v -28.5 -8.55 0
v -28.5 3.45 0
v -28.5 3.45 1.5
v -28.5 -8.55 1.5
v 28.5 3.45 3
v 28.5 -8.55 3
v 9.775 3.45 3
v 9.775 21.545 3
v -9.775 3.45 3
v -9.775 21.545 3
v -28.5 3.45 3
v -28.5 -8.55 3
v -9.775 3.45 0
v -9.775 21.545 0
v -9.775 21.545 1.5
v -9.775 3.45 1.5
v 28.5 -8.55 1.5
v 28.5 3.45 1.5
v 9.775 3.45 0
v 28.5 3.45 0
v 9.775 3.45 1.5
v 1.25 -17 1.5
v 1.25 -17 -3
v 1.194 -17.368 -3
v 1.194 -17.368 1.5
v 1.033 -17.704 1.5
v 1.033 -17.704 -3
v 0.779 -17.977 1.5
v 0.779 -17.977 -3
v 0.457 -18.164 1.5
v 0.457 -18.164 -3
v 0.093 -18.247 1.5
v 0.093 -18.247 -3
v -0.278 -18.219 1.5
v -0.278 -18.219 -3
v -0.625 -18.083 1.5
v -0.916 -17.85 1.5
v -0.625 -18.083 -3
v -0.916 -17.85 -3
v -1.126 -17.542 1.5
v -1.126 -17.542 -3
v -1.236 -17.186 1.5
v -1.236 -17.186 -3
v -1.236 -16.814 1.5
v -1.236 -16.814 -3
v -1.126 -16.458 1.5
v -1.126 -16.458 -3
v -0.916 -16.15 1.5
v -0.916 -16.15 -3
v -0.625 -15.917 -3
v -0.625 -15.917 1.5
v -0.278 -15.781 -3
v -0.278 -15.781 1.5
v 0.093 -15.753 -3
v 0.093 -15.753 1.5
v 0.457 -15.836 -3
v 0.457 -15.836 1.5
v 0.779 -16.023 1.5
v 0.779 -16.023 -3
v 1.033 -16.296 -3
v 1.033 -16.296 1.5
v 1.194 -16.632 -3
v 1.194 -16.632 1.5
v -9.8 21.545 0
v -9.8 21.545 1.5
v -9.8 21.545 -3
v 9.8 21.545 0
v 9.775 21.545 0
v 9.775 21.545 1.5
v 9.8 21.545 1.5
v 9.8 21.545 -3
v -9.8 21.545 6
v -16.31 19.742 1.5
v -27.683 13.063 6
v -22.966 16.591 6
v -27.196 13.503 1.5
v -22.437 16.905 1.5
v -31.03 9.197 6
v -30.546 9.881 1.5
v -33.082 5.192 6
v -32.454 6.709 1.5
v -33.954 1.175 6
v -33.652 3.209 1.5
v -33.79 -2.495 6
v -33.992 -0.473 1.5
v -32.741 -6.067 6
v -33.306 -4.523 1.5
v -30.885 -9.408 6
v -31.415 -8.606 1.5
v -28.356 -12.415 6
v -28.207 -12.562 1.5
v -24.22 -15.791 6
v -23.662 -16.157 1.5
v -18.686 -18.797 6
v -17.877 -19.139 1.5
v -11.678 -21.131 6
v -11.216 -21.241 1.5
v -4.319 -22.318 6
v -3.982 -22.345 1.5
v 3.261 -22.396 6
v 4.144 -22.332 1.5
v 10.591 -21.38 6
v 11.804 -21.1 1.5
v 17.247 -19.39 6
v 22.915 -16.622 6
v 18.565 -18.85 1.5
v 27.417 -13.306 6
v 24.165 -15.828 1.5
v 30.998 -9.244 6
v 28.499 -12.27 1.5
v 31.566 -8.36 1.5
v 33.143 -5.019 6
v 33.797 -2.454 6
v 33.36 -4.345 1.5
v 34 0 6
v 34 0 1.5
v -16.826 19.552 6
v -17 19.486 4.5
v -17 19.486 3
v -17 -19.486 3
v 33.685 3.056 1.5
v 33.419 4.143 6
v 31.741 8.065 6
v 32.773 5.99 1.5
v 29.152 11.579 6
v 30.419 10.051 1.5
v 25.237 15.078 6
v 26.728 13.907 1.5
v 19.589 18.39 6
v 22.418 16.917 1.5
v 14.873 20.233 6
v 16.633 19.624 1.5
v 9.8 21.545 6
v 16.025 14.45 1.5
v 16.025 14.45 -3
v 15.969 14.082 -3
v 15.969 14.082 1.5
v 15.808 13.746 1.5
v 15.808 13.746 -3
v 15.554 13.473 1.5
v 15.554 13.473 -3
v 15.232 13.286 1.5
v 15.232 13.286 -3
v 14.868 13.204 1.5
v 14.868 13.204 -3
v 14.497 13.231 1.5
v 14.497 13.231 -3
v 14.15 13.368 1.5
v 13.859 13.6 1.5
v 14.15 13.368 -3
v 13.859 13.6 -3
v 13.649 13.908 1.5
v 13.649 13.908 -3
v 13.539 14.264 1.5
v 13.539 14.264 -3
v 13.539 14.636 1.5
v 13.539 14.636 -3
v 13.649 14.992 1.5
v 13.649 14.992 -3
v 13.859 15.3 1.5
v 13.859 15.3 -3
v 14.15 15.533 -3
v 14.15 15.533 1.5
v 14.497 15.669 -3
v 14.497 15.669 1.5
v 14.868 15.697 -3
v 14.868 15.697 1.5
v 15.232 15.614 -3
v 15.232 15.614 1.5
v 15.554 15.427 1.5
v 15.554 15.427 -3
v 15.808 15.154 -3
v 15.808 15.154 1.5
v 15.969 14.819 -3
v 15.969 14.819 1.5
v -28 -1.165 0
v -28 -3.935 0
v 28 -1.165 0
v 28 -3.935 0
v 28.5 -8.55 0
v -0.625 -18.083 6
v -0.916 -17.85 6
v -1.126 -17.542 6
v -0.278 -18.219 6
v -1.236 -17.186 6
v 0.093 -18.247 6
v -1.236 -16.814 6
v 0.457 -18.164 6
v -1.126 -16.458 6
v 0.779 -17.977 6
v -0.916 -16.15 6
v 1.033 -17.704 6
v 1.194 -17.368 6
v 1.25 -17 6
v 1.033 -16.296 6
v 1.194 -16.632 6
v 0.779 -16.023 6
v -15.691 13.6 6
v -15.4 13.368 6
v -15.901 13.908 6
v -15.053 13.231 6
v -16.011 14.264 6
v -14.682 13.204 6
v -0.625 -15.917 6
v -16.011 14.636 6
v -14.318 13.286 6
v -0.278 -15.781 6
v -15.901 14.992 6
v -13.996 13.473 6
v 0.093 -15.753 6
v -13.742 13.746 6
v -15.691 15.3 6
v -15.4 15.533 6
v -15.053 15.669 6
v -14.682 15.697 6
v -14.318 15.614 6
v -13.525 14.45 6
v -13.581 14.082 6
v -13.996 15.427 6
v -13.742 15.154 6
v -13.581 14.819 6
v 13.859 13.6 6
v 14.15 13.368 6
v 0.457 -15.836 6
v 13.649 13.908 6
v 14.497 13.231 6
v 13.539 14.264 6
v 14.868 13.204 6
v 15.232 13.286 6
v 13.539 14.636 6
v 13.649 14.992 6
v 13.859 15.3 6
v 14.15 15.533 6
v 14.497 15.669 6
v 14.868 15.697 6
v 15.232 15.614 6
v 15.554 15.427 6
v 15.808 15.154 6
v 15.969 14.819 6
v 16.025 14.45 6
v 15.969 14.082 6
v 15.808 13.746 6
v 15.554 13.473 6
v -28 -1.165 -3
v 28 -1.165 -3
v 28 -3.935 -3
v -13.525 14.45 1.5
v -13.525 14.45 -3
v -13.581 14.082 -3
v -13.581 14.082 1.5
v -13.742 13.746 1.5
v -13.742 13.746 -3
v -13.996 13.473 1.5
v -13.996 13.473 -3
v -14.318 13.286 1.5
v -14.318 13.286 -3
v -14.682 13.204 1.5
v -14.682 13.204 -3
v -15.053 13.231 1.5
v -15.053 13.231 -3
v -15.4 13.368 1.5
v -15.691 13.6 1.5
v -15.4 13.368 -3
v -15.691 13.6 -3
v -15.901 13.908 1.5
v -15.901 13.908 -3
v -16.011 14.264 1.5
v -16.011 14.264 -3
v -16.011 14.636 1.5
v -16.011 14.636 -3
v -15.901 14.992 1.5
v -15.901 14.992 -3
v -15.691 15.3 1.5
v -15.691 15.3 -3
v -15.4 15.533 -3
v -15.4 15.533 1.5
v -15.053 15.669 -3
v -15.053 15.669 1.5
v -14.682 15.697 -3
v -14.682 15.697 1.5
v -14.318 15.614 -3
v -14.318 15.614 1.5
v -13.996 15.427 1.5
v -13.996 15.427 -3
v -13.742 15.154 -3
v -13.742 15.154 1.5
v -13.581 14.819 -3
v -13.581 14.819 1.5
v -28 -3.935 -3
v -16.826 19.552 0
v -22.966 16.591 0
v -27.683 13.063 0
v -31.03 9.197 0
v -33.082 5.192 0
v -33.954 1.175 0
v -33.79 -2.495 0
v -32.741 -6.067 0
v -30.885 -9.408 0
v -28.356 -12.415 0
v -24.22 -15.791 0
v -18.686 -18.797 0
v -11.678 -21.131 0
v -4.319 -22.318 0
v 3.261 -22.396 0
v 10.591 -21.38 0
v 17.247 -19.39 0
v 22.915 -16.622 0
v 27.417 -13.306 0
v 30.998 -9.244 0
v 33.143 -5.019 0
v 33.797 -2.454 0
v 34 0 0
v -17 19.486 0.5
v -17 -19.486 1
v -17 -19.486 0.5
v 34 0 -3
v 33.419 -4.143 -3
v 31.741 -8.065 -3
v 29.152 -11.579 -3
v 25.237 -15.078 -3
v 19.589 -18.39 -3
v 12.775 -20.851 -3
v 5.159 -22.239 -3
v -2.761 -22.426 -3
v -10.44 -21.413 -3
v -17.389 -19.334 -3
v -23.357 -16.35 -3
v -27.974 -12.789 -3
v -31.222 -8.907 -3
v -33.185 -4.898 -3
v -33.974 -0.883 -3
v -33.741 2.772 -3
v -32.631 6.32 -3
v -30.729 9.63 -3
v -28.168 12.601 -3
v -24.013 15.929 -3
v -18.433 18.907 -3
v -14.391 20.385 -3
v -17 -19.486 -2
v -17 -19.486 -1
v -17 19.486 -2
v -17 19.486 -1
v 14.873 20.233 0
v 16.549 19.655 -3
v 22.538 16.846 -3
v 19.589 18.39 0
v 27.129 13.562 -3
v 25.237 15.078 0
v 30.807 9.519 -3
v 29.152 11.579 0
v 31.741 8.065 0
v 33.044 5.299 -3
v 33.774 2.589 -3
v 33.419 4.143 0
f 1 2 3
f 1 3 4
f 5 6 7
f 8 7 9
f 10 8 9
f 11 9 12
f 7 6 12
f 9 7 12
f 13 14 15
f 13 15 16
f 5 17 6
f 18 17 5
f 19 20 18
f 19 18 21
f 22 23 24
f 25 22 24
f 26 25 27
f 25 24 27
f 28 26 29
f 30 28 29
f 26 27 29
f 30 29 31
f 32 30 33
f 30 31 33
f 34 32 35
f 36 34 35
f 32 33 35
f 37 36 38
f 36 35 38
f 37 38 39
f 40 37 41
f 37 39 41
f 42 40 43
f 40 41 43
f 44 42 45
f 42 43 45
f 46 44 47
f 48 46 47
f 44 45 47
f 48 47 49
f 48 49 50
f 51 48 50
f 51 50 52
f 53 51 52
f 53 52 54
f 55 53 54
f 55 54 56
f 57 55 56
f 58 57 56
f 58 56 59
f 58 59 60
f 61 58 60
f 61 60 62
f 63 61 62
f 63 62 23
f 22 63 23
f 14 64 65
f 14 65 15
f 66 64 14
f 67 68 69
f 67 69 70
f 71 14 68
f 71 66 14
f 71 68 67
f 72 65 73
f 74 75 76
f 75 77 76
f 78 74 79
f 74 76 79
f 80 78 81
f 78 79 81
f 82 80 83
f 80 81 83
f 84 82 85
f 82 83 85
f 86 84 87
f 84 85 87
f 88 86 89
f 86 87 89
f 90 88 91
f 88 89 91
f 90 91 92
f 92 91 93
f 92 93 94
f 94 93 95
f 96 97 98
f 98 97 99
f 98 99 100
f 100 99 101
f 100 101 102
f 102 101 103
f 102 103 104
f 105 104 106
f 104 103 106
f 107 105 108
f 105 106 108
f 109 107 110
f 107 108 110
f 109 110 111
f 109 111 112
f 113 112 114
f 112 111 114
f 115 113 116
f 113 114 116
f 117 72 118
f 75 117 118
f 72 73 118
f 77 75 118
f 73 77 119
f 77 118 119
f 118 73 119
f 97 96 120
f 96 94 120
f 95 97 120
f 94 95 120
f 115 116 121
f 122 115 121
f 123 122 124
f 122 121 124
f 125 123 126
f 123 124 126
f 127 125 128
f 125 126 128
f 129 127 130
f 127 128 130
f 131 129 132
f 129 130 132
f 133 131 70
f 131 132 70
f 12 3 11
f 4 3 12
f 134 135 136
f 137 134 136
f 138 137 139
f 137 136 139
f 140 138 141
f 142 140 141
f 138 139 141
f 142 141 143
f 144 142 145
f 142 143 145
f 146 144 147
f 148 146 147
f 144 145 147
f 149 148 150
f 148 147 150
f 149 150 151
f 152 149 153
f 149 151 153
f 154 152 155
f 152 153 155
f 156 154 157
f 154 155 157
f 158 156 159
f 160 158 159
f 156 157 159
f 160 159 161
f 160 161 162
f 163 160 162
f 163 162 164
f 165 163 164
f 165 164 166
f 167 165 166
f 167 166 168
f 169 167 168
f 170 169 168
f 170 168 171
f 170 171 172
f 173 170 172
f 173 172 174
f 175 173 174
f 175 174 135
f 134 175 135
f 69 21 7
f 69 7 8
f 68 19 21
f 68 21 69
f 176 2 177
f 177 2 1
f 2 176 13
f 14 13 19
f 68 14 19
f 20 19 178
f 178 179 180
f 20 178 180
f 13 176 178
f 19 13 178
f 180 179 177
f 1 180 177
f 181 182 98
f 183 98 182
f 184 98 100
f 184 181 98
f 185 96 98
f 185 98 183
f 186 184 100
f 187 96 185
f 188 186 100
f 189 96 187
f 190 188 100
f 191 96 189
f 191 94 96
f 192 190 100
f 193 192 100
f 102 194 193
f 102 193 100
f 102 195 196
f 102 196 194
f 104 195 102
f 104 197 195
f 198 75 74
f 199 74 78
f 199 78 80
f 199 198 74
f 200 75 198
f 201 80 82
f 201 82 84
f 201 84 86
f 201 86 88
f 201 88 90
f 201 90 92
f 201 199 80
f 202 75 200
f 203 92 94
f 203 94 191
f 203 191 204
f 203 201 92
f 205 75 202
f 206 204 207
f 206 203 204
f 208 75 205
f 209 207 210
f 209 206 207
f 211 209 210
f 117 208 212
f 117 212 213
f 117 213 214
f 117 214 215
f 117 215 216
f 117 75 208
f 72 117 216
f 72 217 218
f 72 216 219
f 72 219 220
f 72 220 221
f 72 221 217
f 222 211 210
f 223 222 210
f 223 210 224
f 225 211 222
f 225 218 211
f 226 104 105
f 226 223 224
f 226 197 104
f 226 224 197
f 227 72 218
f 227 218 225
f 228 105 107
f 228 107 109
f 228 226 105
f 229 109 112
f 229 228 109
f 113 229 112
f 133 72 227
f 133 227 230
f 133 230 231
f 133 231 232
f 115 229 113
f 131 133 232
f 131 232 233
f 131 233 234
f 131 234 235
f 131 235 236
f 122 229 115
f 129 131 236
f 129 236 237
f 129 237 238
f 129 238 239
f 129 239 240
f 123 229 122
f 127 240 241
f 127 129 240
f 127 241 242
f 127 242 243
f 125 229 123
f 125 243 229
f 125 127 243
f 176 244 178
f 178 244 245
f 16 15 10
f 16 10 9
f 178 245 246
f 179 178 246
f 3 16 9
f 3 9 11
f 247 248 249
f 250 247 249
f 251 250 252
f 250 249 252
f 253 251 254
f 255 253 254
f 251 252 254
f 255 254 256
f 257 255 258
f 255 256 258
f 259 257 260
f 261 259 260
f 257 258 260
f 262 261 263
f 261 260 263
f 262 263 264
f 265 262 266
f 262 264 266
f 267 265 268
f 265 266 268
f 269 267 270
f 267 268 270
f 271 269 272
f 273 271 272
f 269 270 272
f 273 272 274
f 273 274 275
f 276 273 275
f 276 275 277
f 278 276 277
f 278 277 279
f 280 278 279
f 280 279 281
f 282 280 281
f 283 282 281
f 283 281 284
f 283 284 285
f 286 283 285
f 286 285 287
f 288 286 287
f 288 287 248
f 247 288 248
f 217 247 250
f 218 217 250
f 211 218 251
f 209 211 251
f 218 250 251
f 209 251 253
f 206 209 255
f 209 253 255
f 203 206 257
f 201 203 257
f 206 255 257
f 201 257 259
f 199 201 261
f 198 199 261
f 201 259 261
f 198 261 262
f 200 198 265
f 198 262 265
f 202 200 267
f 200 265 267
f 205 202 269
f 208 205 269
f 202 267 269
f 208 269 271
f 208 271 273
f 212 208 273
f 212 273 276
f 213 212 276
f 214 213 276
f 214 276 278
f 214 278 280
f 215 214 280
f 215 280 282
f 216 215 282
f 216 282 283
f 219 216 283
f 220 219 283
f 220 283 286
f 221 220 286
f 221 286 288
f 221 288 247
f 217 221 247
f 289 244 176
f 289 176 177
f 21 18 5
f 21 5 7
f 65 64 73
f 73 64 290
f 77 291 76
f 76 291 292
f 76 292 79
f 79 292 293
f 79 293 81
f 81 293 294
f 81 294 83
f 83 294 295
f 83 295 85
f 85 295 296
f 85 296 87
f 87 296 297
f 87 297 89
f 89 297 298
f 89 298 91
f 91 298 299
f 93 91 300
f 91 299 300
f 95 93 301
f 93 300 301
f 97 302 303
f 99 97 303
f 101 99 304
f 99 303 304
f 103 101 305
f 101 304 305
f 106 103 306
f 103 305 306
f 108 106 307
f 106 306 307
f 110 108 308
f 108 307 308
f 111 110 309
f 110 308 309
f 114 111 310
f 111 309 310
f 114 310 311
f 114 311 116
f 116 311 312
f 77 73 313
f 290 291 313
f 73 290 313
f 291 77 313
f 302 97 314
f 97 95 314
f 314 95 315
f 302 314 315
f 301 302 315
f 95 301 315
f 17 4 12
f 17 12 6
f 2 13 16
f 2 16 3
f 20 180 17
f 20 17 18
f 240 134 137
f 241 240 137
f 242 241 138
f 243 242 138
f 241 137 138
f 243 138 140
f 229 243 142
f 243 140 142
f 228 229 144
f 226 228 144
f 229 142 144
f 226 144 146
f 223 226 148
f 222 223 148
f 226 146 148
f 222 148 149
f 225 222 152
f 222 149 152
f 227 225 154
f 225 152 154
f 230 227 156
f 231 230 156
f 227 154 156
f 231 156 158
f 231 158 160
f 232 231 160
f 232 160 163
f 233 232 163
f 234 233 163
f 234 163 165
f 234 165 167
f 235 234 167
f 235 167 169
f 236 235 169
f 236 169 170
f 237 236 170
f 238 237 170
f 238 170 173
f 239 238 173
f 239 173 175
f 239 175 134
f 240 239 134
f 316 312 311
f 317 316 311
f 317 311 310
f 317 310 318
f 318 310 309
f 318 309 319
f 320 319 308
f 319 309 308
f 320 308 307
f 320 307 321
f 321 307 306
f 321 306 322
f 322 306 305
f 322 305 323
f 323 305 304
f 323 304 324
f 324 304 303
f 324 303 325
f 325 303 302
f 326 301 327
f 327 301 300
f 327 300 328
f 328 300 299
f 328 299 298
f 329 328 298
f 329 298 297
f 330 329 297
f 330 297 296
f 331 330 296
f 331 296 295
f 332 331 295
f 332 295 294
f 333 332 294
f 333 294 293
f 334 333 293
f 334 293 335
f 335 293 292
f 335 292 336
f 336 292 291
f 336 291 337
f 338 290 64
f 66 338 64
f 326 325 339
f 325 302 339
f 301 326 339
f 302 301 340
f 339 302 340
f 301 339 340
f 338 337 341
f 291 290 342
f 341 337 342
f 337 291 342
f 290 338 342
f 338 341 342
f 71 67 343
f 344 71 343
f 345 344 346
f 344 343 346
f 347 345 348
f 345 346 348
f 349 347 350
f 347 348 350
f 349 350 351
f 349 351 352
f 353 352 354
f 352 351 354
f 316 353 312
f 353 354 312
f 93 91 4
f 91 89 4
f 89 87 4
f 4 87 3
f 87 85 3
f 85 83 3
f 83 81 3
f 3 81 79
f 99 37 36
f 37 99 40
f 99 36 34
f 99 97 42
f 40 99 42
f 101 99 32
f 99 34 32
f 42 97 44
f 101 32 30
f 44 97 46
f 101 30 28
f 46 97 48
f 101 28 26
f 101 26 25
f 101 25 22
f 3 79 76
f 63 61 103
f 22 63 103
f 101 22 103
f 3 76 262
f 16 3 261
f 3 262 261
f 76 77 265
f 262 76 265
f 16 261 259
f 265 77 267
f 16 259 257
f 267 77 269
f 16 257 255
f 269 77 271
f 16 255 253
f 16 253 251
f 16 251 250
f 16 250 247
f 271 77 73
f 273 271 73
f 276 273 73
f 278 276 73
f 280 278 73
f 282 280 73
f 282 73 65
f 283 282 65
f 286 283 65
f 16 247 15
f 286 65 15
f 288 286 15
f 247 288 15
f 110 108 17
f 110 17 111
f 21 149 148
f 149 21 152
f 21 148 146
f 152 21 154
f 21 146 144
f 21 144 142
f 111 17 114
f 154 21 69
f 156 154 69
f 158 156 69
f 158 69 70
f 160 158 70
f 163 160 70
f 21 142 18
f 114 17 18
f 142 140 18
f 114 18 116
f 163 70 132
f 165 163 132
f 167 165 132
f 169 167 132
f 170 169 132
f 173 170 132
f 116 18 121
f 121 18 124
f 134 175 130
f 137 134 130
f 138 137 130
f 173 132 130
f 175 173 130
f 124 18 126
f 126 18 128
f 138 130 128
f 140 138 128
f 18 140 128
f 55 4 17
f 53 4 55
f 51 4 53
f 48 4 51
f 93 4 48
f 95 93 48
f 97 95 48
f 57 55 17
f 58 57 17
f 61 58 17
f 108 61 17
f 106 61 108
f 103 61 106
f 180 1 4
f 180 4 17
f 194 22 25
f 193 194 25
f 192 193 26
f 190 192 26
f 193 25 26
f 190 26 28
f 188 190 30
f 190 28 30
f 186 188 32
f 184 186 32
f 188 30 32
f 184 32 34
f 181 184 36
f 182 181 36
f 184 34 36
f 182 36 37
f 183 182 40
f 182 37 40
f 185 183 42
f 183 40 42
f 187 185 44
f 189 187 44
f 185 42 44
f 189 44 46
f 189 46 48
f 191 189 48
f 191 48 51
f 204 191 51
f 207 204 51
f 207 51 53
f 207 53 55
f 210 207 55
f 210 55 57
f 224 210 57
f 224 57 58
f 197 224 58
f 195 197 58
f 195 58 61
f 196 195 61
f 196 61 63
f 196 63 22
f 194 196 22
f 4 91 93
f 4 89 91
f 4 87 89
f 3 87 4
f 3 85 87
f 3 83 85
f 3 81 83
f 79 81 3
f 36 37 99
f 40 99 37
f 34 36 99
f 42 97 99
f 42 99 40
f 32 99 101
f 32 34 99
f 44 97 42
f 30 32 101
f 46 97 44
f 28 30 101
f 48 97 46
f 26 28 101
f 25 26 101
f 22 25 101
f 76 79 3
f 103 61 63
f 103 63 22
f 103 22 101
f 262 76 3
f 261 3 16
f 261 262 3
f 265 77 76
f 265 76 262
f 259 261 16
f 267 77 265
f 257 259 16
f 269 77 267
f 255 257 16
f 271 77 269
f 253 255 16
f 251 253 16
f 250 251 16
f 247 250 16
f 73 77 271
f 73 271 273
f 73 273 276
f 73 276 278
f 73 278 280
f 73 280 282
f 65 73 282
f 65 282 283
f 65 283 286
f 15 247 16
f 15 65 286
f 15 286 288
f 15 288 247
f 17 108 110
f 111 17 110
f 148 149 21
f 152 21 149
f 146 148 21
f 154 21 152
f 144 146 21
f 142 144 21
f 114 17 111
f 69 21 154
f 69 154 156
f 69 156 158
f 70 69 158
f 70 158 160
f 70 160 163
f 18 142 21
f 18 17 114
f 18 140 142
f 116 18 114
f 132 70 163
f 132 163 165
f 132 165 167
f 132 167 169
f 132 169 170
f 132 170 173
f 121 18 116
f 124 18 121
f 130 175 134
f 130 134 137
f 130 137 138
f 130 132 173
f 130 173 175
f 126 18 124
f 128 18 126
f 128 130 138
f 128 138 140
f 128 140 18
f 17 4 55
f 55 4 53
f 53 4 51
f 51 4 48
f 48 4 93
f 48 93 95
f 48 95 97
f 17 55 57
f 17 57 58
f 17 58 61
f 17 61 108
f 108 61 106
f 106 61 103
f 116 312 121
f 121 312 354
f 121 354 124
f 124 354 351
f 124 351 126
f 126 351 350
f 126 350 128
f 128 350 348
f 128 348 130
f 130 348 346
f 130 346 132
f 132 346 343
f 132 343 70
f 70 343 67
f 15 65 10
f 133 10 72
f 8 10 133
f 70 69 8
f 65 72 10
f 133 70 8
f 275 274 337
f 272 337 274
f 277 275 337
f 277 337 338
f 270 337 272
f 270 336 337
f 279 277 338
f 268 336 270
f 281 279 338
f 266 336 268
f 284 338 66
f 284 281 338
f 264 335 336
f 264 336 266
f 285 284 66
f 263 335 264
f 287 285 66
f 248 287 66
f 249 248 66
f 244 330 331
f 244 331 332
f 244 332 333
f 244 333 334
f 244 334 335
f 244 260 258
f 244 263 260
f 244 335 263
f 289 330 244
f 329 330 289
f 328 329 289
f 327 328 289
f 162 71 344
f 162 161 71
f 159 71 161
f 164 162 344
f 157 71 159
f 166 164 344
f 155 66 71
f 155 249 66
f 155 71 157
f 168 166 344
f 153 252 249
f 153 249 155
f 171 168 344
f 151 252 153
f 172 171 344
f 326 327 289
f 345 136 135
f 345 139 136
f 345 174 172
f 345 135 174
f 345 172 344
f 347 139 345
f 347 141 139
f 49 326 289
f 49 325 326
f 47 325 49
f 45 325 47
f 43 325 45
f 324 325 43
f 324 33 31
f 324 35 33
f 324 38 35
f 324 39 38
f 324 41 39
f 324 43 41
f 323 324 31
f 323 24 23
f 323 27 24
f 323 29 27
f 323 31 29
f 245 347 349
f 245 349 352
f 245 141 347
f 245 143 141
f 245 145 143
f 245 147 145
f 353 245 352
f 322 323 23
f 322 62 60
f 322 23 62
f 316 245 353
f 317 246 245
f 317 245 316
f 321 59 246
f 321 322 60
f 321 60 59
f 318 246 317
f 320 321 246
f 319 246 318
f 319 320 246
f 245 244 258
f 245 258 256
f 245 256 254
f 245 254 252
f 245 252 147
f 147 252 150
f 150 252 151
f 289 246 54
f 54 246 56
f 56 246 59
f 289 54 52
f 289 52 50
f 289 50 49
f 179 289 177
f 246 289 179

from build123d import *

# Parameters (mm, degrees)
BOX_BOTTOM_HALF_0_W     = 69.994952
BOX_BOTTOM_HALF_0_H     = 46.031044
BOX_BOTTOM_HALF_0_DEPTH = 5.5
PAD_DEPTH               = 6
POCKET_DEPTH            = 3
PAD001_DEPTH            = 3
SKETCH003_W             = 56
SKETCH003_H             = 2.77
POCKET001_DEPTH         = 3
SKETCH004_W             = 19.6
SKETCH004_H             = 1
POCKET002_DEPTH         = 9.001
SKETCH005_R             = 1.25
POCKET003_DEPTH         = 9.001


with BuildPart() as box_bottom_half_0_body:
    # box_bottom_half_0 → box_bottom_half_0 (new body)
    with BuildSketch(Plane(origin=(-34.994952, -23.485952, -4), x_dir=(1, 0, 0), z_dir=(0, 0, 1))):
        with Locations((34.997476, 23.015522)):
            Rectangle(BOX_BOTTOM_HALF_0_W, BOX_BOTTOM_HALF_0_H)
    extrude(amount=BOX_BOTTOM_HALF_0_DEPTH)


with BuildPart() as body:
    # Sketch → Pad (new body)
    with BuildSketch(Plane.XY):
        with BuildLine():
            add(Edge.make_bspline(
                [(34, 0), (34, 38.971143), (-17, 19.485572), (-68, 0), (-17, -19.485572), (34, -38.971143), (34, 0)],
                knots=[0, 0, 0, 2.094395, 2.094395, 4.18879, 4.18879, 6.283185, 6.283185, 6.283185], degree=2, weights=[1, 0.5, 1, 0.5, 1, 0.5, 1]))
        make_face()
    extrude(amount=PAD_DEPTH)

    # Sketch001 (on Face2 of Pad) → Pocket (cut)
    with BuildSketch(Plane(origin=(0, 0, 0), x_dir=(1, 0, 0), z_dir=(0, 0, -1))):
        Polygon((9.775, -3.450064), (9.775, -21.550064), (-9.775, -21.550064), (-9.775, -3.450064), (-28.5, -3.450064), (-28.5, 8.549936), (28.5, 8.549936), (28.5, -3.450064), align=None)
    extrude(amount=-POCKET_DEPTH, mode=Mode.SUBTRACT)

    # Sketch002 (on Face2 of Pocket) → Pad001 (join)
    with BuildSketch(Plane(origin=(0, 0, 0), x_dir=(1, 0, 0), z_dir=(0, 0, -1))):
        with BuildLine():
            add(Edge.make_bspline(
                [(34, 0), (34, 38.971143), (-17, 19.485572), (-68, 0), (-17, -19.485572), (34, -38.971143), (34, 0)],
                knots=[0, 0, 0, 2.094395, 2.094395, 4.18879, 4.18879, 6.283185, 6.283185, 6.283185], degree=2, weights=[1, 0.5, 1, 0.5, 1, 0.5, 1]))
        make_face()
    extrude(amount=PAD001_DEPTH)

    # Sketch003 (on Face4 of Pad001) → Pocket001 (cut)
    with BuildSketch(Plane(origin=(0, 0, -3), x_dir=(1, 0, 0), z_dir=(0, 0, -1))):
        with Locations((0, 2.549936)):
            Rectangle(SKETCH003_W, SKETCH003_H)
    extrude(amount=-POCKET001_DEPTH, mode=Mode.SUBTRACT)

    # Sketch004 (on Face4 of Pocket001) → Pocket002 (cut, through all)
    with BuildSketch(Plane(origin=(0, 0, -3), x_dir=(1, 0, 0), z_dir=(0, 0, -1))):
        with Locations((0, -22.045091)):
            Rectangle(SKETCH004_W, SKETCH004_H)
    extrude(amount=-POCKET002_DEPTH, mode=Mode.SUBTRACT)

    # Sketch005 (on Face7 of Pocket002) → Pocket003 (cut, through all)
    with BuildSketch(Plane(origin=(0, 0, -3), x_dir=(1, 0, 0), z_dir=(0, 0, -1))):
        with Locations((-14.775, -14.450064)):
            Circle(SKETCH005_R)
        with Locations((0, 17)):
            Circle(SKETCH005_R)
        with Locations((14.775, -14.450064)):
            Circle(SKETCH005_R)
    extrude(amount=-POCKET003_DEPTH, mode=Mode.SUBTRACT)


with BuildPart() as bottom_half_0_body:
    # bottom_half_0 base: copy of Body
    add(body.part)

    # bottom_half_0: intersect box_bottom_half_0 body
    add(box_bottom_half_0_body.part, mode=Mode.INTERSECT)


with BuildPart() as top_half_0_body:
    # top_half_0 base: copy of Body
    add(body.part)

    # top_half_0: cut box_bottom_half_0 body
    add(box_bottom_half_0_body.part, mode=Mode.SUBTRACT)


solid = Compound([bottom_half_0_body.part, top_half_0_body.part])
